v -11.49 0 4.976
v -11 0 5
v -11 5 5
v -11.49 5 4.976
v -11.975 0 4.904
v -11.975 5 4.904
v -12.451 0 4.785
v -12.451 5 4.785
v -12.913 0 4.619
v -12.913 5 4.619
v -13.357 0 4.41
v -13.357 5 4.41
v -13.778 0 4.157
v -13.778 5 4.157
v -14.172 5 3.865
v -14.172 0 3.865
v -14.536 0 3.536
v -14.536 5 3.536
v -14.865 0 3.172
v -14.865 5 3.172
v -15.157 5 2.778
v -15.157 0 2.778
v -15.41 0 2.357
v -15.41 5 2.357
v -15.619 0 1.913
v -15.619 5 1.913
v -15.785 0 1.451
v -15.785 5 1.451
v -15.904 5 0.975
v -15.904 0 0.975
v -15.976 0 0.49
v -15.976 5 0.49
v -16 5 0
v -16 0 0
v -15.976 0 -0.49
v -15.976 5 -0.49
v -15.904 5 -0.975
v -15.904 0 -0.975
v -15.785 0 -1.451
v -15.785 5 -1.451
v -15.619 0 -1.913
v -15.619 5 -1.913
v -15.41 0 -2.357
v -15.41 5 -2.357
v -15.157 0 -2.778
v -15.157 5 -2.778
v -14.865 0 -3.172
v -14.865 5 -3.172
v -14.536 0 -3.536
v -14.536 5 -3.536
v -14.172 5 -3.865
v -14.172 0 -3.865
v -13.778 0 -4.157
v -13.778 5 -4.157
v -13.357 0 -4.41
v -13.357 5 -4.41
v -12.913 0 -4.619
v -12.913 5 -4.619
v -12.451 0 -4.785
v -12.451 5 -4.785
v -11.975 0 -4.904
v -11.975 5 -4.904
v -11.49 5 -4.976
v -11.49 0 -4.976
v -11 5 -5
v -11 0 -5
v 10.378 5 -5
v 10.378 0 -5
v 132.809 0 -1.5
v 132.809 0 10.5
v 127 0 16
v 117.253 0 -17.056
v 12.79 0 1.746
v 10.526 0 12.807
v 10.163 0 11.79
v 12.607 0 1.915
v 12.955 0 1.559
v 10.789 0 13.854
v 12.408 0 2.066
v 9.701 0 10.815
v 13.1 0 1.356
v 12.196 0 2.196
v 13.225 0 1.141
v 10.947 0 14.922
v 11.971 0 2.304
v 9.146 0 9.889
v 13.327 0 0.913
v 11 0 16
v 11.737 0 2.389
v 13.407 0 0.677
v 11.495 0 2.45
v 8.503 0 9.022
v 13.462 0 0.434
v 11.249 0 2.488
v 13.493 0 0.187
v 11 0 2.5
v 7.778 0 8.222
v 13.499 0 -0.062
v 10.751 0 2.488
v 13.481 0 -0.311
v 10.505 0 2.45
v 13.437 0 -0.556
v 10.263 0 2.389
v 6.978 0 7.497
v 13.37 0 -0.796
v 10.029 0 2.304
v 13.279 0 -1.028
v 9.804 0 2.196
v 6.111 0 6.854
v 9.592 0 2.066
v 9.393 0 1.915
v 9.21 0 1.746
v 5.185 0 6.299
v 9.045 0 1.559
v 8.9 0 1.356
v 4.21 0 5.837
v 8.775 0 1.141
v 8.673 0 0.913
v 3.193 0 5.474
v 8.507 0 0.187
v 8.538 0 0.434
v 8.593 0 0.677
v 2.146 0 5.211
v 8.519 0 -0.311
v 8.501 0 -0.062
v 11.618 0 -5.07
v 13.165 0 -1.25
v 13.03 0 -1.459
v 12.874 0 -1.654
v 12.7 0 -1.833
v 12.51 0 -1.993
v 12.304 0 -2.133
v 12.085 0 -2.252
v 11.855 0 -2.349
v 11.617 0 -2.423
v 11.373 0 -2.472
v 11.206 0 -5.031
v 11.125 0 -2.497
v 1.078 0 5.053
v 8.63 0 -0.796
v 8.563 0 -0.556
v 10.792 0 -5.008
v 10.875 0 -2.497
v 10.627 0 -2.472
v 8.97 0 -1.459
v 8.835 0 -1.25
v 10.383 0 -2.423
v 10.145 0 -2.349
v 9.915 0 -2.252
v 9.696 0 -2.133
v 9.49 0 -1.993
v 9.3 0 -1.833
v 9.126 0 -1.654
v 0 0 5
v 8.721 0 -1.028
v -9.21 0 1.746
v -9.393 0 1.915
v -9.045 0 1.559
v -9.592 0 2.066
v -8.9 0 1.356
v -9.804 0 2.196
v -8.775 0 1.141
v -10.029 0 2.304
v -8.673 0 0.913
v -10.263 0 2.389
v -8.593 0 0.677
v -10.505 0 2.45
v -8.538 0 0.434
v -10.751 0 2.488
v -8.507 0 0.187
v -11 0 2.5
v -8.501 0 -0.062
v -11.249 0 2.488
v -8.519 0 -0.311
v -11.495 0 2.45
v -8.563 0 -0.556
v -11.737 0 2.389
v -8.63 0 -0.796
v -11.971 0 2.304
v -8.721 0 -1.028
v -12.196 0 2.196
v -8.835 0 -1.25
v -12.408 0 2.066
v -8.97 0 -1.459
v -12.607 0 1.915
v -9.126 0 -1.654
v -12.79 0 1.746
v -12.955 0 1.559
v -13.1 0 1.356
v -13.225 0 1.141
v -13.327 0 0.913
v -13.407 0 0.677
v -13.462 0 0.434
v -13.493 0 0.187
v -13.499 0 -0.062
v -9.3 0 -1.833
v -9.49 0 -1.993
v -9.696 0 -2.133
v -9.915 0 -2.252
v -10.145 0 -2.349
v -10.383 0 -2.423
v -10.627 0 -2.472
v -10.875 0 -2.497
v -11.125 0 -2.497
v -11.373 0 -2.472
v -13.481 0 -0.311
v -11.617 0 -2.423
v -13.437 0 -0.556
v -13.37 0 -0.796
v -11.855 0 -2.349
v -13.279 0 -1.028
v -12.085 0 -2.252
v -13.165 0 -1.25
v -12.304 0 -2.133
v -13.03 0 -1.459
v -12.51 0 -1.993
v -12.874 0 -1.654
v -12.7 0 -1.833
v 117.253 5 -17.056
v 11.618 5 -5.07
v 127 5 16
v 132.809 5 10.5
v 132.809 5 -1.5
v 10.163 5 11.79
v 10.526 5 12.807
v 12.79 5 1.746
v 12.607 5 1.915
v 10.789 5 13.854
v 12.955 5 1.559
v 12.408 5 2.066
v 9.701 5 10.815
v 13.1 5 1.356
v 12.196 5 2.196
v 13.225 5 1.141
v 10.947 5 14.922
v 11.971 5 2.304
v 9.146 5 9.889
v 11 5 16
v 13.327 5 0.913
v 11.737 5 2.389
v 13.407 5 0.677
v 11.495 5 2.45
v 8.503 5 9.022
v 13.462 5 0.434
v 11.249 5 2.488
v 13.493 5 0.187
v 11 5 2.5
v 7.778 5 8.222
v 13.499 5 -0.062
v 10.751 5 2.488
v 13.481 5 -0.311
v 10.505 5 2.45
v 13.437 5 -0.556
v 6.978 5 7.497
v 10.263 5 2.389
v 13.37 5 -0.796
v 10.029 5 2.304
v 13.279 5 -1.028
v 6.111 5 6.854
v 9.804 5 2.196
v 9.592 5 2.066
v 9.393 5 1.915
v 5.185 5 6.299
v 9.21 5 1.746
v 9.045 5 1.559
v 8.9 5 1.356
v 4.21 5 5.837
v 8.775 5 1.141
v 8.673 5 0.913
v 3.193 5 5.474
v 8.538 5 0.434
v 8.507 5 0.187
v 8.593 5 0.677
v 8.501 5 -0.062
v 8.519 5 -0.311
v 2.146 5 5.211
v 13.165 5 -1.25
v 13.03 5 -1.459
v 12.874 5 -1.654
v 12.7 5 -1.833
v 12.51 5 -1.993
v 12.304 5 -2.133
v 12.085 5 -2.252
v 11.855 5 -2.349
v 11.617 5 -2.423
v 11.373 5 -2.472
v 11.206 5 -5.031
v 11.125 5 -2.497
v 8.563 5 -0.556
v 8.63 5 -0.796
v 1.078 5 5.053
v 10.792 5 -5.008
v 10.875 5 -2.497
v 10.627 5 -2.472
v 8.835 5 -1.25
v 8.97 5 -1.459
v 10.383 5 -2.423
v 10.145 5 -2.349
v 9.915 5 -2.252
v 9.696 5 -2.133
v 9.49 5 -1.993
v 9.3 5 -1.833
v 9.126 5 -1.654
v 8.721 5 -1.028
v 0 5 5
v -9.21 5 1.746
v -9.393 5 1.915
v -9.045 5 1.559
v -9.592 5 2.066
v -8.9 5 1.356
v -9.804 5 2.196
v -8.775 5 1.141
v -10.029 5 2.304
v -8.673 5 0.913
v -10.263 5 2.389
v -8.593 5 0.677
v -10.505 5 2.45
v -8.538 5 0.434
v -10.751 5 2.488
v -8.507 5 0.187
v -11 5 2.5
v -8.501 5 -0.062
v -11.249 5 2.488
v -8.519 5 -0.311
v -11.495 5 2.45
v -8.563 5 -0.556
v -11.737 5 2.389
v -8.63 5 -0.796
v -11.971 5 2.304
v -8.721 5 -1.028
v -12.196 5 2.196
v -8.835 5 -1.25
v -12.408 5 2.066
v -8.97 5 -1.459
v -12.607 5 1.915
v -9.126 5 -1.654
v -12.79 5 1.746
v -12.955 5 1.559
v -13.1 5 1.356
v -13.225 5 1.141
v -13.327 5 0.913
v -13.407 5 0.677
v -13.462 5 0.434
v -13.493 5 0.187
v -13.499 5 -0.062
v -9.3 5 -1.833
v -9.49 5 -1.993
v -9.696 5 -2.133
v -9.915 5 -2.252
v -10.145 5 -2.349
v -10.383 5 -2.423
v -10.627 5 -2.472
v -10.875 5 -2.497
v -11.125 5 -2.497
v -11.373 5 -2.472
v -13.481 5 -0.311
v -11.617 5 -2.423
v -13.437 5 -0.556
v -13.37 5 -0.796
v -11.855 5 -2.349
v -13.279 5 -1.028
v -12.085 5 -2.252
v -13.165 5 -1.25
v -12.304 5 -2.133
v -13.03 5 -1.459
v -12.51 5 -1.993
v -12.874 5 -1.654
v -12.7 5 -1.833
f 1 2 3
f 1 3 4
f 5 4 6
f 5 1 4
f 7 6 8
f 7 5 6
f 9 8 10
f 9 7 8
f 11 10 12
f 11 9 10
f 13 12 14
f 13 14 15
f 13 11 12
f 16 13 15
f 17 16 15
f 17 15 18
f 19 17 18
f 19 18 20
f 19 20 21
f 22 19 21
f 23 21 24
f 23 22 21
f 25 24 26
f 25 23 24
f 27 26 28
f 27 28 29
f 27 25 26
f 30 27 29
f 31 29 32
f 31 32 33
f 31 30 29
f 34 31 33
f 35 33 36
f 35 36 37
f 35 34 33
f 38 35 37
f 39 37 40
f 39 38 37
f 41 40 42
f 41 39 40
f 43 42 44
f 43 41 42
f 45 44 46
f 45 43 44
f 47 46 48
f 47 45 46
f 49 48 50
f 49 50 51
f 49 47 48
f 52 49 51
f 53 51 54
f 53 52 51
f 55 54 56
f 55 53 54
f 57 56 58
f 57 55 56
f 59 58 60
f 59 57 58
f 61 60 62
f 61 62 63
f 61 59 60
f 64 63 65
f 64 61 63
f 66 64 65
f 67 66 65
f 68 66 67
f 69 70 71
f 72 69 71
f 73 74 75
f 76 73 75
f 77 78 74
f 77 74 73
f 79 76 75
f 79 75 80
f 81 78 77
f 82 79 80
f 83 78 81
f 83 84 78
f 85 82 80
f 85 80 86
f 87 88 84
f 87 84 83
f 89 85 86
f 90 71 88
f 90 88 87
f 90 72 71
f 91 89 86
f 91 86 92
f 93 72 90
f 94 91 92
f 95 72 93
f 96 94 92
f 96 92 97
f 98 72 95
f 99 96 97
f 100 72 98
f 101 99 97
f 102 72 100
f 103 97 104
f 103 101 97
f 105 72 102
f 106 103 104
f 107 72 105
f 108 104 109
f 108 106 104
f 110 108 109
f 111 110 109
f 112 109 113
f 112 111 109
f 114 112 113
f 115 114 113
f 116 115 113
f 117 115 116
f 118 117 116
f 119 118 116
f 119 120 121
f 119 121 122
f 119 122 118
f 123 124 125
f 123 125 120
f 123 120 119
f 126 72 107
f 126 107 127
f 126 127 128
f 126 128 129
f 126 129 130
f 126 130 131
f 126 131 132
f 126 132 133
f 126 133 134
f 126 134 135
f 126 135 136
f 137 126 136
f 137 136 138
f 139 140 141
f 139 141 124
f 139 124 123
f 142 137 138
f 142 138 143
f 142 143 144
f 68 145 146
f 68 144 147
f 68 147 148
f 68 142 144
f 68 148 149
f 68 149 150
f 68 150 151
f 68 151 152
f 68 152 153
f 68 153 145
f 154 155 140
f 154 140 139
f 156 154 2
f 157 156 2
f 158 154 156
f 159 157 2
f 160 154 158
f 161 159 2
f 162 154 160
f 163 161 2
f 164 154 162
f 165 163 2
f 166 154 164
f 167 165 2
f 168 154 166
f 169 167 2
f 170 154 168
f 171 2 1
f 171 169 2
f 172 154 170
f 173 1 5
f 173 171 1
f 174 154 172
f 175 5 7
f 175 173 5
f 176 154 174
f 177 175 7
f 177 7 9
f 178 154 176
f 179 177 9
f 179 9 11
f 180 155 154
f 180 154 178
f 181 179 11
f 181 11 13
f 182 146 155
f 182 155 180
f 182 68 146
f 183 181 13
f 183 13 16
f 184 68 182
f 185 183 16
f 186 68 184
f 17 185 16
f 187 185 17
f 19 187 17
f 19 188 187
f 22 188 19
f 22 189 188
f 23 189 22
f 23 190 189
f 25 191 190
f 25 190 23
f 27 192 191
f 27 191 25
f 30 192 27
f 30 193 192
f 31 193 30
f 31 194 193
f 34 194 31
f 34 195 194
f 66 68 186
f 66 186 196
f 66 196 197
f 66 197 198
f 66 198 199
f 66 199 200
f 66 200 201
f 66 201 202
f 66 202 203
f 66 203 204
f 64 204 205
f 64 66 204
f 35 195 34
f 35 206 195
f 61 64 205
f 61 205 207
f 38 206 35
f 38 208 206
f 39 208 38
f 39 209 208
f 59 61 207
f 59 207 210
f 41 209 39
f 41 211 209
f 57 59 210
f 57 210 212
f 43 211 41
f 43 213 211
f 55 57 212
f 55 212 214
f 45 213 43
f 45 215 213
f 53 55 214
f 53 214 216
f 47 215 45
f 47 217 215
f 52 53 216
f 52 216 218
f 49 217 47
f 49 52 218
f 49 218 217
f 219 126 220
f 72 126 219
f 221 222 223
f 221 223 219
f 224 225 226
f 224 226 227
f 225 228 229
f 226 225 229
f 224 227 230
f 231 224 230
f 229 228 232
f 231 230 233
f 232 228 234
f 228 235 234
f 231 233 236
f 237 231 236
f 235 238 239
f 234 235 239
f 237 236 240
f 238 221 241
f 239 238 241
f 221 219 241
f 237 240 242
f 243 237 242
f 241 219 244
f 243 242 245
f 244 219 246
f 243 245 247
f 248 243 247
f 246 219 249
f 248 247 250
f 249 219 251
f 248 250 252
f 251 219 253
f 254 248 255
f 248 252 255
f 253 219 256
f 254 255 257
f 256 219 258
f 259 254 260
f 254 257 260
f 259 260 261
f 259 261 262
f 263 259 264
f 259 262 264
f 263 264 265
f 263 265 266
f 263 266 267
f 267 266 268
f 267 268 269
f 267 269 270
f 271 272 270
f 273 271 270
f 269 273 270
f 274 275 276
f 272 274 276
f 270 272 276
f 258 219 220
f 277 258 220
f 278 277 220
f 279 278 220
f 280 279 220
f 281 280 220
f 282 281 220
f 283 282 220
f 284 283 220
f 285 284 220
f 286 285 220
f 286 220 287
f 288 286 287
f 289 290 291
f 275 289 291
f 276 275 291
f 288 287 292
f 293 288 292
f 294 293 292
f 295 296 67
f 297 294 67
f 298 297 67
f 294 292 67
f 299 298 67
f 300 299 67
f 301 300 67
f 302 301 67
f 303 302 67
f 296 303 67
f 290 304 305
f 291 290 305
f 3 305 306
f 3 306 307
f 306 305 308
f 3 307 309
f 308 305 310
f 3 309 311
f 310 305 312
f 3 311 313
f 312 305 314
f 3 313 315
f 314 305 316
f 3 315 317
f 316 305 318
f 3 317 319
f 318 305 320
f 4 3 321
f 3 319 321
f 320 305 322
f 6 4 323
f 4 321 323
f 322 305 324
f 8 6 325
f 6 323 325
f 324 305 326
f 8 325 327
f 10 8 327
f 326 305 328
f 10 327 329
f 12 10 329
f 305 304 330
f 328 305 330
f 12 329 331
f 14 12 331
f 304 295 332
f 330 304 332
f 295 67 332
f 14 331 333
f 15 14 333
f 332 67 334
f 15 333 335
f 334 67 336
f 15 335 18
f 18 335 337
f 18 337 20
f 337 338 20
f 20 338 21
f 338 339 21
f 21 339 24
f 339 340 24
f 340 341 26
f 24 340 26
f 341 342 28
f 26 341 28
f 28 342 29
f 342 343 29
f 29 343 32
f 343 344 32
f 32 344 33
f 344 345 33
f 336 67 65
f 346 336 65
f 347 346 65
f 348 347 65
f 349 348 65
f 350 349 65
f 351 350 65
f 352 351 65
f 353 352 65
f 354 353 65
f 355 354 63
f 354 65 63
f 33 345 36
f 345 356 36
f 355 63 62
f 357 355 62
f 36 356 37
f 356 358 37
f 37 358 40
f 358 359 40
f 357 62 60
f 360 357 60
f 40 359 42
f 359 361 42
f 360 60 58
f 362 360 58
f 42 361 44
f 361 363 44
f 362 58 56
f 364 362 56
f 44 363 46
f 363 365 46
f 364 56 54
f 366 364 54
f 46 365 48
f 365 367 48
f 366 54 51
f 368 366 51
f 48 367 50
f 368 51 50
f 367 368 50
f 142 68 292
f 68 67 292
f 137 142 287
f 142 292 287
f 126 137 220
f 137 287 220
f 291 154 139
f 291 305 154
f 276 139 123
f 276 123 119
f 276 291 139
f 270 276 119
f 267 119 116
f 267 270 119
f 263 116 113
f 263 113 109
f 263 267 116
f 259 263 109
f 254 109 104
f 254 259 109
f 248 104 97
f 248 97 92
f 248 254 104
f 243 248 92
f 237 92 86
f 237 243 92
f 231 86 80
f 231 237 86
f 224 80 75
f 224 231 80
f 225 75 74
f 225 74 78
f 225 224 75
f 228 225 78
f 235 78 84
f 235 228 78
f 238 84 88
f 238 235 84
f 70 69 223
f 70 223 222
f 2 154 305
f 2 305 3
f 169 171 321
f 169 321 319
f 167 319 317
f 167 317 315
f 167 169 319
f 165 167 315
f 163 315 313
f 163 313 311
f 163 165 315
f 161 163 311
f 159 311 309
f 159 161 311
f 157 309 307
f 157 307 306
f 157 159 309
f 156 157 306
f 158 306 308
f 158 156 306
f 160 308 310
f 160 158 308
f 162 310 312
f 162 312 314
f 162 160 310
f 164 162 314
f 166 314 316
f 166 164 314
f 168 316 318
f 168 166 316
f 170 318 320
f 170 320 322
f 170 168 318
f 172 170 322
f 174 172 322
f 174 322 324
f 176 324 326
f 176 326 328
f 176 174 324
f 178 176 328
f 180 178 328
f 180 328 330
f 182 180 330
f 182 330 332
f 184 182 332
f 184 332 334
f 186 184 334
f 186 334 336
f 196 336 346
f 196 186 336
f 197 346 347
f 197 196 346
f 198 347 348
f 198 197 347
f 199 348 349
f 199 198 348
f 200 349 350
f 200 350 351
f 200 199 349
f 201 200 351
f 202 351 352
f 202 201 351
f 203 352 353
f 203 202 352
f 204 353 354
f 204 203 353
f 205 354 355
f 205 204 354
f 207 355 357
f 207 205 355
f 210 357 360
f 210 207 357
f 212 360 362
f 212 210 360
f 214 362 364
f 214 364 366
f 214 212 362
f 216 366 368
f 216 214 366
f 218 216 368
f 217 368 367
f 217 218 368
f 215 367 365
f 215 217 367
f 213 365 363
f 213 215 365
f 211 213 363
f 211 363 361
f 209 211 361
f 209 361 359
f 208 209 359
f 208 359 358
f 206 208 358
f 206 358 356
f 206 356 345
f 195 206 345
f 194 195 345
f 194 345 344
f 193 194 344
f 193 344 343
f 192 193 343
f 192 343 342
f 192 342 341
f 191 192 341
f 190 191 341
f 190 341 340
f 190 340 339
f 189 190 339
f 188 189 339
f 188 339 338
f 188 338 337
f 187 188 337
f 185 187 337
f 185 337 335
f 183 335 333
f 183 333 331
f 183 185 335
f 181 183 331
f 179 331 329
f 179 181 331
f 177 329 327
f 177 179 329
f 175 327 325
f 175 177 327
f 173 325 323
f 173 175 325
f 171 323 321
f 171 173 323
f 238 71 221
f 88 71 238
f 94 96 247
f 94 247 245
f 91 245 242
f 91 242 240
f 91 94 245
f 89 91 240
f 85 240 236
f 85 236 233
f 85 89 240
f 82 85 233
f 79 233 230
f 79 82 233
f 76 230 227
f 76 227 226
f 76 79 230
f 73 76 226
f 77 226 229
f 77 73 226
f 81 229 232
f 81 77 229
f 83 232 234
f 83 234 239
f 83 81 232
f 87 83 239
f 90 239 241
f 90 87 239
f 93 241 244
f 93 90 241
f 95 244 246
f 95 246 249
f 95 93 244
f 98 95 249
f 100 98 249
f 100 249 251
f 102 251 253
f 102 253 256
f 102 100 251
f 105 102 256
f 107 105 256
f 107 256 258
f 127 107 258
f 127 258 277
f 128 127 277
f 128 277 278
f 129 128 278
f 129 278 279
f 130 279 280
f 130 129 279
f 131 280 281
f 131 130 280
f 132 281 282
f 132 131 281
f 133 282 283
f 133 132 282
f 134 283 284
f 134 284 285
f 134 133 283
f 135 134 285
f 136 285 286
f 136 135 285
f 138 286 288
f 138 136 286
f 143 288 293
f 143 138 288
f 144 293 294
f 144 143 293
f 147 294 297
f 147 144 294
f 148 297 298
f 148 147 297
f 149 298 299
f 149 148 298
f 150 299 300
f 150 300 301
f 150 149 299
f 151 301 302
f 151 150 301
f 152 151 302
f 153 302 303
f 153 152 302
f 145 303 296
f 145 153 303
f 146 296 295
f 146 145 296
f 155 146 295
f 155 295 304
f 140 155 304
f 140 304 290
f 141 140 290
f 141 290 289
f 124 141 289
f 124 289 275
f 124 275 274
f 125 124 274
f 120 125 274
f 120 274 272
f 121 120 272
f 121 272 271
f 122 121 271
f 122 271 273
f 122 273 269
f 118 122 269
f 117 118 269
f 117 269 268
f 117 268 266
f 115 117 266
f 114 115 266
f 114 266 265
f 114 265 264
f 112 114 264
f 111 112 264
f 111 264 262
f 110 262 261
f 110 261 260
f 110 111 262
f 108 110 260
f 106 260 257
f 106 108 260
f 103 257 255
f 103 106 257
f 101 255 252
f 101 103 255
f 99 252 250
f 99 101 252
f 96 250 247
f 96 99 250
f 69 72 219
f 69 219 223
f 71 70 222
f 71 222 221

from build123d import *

# Parameters (mm, degrees)
SKETCH_1_R      = 2.5
EXTRUDE_1_DEPTH = 5
FILLET_2_R      = 11
FILLET_3_R      = 11


with BuildPart() as part:
    # 草图1 → 凸台-拉伸1 (new body)
    with BuildSketch(Plane(origin=(0, 0, 0), x_dir=(1, 0, 0), z_dir=(0, 1, 0))):
        with BuildLine():
            Line((11, -5), (-11, -5))
            ThreePointArc((-11, -5), (-16, 0), (-11, 5))
            Line((-11, 5), (11, 5))
            Line((11, 5), (117.253125833, 17.056349186))
            Line((117.253125833, 17.056349186), (120.081552958, 14.227922061))
            Line((120.081552958, 14.227922061), (132.809475019, 1.5))
            Line((132.809475019, 1.5), (132.809475019, -10.5))
            Line((132.809475019, -10.5), (127, -16))
            Line((127, -16), (119, -16))
            Line((119, -16), (19, -16))
            Line((19, -16), (11, -16))
            Line((11, -16), (11, -5))
        make_face()
        with Locations(Location((-11, 0, 0), (0, 0, 270))):
            Circle(SKETCH_1_R, mode=Mode.SUBTRACT)
        with Locations(Location((11, 0, 0), (0, 0, 270))):
            Circle(SKETCH_1_R, mode=Mode.SUBTRACT)
    extrude(amount=EXTRUDE_1_DEPTH)

    # 圆角2
    fillet_2_edges = [part.edges().sort_by_distance(p)[0] for p in [
        (11, 2.5, 5),
    ]]
    fillet(fillet_2_edges, radius=FILLET_2_R - 0.0001)  # a hair under: the kernel refuses the full size

    # 圆角3
    fillet_3_edges = [part.edges().sort_by_distance(p)[0] for p in [
        (11, 2.5, -5),
    ]]
    fillet(fillet_3_edges, radius=FILLET_3_R)


solid = part.part
